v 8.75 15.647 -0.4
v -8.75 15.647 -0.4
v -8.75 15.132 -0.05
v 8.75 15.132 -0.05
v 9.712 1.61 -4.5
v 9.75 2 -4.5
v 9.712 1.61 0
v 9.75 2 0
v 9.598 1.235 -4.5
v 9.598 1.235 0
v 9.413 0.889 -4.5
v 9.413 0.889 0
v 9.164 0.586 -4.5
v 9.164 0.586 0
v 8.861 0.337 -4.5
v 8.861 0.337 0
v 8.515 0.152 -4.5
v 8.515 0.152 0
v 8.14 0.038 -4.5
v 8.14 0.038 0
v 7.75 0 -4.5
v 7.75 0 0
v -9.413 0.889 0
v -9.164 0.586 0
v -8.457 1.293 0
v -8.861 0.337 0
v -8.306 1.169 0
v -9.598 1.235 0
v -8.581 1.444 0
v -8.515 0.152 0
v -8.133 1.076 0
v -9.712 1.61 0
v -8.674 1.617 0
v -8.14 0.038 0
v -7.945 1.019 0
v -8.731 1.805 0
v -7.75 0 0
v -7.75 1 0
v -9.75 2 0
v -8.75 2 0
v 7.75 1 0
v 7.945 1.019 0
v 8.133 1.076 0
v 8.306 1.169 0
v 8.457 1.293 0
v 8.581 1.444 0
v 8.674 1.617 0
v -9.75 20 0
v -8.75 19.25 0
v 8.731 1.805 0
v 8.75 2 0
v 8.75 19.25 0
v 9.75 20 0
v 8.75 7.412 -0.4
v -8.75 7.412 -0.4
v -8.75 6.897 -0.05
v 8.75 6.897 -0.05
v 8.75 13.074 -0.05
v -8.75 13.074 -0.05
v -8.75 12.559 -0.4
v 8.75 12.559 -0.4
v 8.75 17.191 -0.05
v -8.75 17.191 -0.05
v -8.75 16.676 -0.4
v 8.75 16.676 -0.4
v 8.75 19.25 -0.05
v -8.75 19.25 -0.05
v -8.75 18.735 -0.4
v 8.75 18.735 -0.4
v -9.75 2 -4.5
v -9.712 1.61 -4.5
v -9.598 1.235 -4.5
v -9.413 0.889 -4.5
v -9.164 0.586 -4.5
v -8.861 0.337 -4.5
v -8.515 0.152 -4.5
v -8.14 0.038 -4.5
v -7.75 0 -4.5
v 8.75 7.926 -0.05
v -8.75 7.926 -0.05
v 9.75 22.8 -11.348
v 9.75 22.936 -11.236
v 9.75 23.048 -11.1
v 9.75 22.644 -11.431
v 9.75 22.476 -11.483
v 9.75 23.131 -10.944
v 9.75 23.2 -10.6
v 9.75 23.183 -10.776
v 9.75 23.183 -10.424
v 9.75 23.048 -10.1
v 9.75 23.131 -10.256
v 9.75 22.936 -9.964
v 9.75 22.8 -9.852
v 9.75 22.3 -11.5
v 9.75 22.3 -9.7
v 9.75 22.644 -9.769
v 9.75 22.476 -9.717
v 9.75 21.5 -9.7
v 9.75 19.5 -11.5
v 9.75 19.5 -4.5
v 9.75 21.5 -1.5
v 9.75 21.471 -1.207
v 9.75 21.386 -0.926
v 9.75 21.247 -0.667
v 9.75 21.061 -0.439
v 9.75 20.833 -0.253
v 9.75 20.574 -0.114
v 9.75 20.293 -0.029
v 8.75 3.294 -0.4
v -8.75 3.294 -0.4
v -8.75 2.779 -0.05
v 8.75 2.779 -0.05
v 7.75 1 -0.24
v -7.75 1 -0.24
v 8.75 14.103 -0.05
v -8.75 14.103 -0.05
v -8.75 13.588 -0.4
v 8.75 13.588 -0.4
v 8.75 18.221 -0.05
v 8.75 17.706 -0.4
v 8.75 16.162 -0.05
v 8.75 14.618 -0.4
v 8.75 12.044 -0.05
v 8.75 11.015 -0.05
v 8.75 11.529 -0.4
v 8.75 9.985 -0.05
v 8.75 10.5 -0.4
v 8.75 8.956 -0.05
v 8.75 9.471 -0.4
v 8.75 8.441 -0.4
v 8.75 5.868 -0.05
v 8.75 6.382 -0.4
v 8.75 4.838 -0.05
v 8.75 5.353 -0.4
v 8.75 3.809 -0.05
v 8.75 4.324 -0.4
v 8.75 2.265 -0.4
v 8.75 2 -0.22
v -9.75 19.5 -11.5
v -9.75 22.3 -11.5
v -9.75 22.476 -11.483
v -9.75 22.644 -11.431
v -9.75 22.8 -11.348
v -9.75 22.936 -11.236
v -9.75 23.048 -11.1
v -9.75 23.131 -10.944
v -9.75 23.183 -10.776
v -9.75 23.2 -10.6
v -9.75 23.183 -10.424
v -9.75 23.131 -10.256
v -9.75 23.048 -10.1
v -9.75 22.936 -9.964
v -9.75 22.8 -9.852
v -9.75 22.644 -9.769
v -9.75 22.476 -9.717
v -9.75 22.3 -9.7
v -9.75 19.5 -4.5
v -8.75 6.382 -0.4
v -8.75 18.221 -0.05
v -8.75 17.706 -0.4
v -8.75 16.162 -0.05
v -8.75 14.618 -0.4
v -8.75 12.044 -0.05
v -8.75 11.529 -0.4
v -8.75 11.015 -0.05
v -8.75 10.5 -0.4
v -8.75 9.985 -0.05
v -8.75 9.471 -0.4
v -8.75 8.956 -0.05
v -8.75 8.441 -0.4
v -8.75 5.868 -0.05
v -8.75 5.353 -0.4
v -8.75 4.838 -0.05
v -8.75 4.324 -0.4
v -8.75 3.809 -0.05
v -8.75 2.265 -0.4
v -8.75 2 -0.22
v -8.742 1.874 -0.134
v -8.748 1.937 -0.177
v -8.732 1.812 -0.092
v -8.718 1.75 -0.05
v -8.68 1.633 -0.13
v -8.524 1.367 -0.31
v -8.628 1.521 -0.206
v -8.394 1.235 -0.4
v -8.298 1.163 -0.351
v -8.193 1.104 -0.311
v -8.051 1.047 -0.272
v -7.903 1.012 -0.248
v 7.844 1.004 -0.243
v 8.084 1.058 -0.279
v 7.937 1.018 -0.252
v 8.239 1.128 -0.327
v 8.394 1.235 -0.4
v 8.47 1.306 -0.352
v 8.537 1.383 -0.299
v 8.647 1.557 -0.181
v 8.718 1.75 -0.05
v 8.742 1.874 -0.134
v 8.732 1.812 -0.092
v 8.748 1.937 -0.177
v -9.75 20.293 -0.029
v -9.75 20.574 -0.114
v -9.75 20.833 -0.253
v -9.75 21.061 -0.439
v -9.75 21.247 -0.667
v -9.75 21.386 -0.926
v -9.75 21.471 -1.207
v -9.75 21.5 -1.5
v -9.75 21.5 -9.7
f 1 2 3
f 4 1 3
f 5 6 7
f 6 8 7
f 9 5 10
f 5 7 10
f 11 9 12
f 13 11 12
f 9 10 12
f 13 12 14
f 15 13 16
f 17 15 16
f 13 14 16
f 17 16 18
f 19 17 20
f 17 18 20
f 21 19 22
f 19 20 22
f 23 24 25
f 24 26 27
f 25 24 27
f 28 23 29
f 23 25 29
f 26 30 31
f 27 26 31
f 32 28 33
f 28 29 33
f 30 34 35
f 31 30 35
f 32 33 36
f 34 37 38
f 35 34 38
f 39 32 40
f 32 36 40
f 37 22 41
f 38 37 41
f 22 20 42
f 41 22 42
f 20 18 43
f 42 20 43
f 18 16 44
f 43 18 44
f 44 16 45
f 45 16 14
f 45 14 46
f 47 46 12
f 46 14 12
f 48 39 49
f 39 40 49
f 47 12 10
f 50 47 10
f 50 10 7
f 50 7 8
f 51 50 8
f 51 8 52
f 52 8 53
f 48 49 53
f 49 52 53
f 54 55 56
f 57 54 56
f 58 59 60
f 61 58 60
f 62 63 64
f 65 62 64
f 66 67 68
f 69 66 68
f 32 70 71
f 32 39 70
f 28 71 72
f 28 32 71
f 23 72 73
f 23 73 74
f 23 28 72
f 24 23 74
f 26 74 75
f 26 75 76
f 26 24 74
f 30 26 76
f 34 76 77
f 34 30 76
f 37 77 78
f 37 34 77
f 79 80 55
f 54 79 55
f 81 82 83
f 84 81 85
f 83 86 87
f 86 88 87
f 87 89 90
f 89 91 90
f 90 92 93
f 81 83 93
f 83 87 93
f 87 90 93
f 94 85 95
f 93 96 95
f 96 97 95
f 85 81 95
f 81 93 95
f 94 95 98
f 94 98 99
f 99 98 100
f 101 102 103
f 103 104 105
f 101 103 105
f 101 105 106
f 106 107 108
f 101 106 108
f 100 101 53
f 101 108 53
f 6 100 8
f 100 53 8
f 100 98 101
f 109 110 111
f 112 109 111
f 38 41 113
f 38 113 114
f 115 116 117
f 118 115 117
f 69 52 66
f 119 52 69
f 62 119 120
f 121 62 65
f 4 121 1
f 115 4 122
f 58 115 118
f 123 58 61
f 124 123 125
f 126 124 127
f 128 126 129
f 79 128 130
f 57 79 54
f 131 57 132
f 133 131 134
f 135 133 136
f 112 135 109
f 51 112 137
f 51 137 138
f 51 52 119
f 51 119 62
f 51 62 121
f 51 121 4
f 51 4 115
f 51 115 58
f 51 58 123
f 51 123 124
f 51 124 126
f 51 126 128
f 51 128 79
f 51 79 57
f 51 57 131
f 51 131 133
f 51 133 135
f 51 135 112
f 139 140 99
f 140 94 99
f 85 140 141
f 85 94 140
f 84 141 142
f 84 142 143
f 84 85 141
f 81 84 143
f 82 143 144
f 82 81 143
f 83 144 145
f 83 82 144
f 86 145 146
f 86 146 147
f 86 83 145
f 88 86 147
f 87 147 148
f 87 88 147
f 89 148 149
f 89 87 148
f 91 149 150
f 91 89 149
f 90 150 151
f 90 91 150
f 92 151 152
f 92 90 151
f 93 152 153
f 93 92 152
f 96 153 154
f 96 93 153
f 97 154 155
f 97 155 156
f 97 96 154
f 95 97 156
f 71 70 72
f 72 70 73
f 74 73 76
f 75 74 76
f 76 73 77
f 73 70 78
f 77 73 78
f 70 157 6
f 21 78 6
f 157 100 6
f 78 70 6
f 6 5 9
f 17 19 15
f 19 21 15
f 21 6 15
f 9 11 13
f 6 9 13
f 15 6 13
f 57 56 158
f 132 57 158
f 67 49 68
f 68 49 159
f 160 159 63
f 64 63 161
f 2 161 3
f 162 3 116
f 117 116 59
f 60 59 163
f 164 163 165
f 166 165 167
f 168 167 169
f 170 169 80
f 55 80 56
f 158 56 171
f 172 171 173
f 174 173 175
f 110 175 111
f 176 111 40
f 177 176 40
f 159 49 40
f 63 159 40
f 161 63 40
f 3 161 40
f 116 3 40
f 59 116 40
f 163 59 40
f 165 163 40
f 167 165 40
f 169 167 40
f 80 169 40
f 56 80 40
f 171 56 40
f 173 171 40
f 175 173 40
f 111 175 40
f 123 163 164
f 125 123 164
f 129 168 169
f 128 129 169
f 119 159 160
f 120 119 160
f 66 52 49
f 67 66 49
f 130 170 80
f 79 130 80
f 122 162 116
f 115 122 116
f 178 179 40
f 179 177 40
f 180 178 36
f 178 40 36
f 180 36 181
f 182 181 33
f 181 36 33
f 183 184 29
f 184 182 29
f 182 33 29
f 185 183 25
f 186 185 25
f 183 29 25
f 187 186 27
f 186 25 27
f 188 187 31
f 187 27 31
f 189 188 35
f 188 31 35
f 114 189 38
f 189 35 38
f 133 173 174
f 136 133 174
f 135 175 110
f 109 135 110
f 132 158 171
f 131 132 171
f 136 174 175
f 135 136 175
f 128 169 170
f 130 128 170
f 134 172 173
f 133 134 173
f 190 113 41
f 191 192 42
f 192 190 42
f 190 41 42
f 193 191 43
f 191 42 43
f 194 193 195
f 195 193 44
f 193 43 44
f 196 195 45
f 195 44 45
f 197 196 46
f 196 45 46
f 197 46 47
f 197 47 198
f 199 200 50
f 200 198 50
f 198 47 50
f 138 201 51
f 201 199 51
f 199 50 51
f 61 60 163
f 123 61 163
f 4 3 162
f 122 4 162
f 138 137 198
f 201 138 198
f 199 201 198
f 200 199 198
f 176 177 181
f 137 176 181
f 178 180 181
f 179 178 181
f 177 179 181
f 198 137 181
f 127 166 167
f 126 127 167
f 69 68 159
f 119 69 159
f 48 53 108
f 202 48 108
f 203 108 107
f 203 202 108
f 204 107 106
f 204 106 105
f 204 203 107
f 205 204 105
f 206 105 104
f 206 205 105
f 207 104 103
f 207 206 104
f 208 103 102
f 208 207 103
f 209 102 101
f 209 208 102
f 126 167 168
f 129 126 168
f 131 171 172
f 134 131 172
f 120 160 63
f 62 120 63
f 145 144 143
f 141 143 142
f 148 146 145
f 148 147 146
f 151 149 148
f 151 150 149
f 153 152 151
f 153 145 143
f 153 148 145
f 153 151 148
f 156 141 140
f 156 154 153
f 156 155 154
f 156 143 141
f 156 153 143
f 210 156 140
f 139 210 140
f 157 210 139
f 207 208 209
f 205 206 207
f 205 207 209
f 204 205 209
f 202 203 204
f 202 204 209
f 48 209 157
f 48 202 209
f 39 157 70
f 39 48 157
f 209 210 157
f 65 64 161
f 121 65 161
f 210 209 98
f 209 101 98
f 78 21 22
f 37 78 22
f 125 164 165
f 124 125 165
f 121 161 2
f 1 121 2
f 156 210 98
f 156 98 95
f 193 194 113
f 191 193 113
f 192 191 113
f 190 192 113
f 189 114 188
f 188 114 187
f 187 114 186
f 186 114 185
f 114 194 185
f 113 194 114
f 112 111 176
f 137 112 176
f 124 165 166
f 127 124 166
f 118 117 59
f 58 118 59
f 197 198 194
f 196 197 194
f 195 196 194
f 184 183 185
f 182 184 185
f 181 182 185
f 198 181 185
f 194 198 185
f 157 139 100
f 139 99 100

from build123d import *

# Parameters (mm, degrees)
PAD_DEPTH           = 9.75
FILLET_R            = 2
POCKET_DEPTH        = 0.5
PAD001_DEPTH        = 17.499961
LINEARPATTERN_COUNT = 18
LINEARPATTERN_PITCH = 1.029412
FILLET001_R         = 1.5


with BuildPart() as part:
    # Sketch → Pad (new body, symmetric)
    with BuildSketch(Plane.YZ):
        with BuildLine():
            Line((0, 0), (21.5, 0))
            Line((21.5, 0), (21.5, -9.7))
            Line((21.5, -9.7), (22.3, -9.7))
            ThreePointArc((22.3, -11.5), (23.2, -10.6), (22.3, -9.7))
            Line((22.3, -11.5), (19.5, -11.5))
            Line((19.5, -11.5), (19.5, -4.5))
            Line((19.5, -4.5), (0, -4.5))
            Line((0, -4.5), (0, 0))
        make_face()
    extrude(amount=PAD_DEPTH, both=True)

    # Fillet
    fillet_edges = [part.edges().sort_by_distance(p)[0] for p in [
        (9.75, 0, -2.25),
        (-9.75, 0, -2.25),
    ]]
    fillet(fillet_edges, radius=FILLET_R)

    # Sketch001 (on Face1 of Fillet) → Pocket (cut)
    with BuildSketch(Plane(origin=(0, 0, 0), x_dir=(0, -1, 0), z_dir=(0, 0, 1))):
        with BuildLine():
            ThreePointArc((-1, 7.749997), (-1.292892, 8.457106), (-2, 8.75))
            Line((-19.25, 8.75), (-2, 8.75))
            Line((-19.25, 8.75), (-19.25, -8.749961))
            Line((-19.25, -8.749961), (-2, -8.749961))
            ThreePointArc((-2, -8.749961), (-1.292922, -8.45708), (-1.000039, -7.750003))
            Line((-1, 7.749997), (-1.000039, -7.750003))
        make_face()
    extrude(amount=-POCKET_DEPTH, mode=Mode.SUBTRACT)

    # Sketch002 (on Face11 of Pocket) → Pad001 (join)
    with BuildSketch(Plane.YZ.offset(-8.749961)):
        Polygon((18.220588, -0.05), (18.220588, -0.5), (19.25, -0.5), (19.25, -0.05), (18.735294, -0.4), align=None)
    pad001 = extrude(amount=PAD001_DEPTH)

    # LinearPattern: Pad001 ×18
    with Locations(*[(0, -i * LINEARPATTERN_PITCH, 0) for i in range(1, LINEARPATTERN_COUNT)]):
        add(pad001)

    # Fillet001
    fillet001_edges = [part.edges().sort_by_distance(p)[0] for p in [
        (0, 21.5, 0),
    ]]
    fillet(fillet001_edges, radius=FILLET001_R)


solid = part.part
